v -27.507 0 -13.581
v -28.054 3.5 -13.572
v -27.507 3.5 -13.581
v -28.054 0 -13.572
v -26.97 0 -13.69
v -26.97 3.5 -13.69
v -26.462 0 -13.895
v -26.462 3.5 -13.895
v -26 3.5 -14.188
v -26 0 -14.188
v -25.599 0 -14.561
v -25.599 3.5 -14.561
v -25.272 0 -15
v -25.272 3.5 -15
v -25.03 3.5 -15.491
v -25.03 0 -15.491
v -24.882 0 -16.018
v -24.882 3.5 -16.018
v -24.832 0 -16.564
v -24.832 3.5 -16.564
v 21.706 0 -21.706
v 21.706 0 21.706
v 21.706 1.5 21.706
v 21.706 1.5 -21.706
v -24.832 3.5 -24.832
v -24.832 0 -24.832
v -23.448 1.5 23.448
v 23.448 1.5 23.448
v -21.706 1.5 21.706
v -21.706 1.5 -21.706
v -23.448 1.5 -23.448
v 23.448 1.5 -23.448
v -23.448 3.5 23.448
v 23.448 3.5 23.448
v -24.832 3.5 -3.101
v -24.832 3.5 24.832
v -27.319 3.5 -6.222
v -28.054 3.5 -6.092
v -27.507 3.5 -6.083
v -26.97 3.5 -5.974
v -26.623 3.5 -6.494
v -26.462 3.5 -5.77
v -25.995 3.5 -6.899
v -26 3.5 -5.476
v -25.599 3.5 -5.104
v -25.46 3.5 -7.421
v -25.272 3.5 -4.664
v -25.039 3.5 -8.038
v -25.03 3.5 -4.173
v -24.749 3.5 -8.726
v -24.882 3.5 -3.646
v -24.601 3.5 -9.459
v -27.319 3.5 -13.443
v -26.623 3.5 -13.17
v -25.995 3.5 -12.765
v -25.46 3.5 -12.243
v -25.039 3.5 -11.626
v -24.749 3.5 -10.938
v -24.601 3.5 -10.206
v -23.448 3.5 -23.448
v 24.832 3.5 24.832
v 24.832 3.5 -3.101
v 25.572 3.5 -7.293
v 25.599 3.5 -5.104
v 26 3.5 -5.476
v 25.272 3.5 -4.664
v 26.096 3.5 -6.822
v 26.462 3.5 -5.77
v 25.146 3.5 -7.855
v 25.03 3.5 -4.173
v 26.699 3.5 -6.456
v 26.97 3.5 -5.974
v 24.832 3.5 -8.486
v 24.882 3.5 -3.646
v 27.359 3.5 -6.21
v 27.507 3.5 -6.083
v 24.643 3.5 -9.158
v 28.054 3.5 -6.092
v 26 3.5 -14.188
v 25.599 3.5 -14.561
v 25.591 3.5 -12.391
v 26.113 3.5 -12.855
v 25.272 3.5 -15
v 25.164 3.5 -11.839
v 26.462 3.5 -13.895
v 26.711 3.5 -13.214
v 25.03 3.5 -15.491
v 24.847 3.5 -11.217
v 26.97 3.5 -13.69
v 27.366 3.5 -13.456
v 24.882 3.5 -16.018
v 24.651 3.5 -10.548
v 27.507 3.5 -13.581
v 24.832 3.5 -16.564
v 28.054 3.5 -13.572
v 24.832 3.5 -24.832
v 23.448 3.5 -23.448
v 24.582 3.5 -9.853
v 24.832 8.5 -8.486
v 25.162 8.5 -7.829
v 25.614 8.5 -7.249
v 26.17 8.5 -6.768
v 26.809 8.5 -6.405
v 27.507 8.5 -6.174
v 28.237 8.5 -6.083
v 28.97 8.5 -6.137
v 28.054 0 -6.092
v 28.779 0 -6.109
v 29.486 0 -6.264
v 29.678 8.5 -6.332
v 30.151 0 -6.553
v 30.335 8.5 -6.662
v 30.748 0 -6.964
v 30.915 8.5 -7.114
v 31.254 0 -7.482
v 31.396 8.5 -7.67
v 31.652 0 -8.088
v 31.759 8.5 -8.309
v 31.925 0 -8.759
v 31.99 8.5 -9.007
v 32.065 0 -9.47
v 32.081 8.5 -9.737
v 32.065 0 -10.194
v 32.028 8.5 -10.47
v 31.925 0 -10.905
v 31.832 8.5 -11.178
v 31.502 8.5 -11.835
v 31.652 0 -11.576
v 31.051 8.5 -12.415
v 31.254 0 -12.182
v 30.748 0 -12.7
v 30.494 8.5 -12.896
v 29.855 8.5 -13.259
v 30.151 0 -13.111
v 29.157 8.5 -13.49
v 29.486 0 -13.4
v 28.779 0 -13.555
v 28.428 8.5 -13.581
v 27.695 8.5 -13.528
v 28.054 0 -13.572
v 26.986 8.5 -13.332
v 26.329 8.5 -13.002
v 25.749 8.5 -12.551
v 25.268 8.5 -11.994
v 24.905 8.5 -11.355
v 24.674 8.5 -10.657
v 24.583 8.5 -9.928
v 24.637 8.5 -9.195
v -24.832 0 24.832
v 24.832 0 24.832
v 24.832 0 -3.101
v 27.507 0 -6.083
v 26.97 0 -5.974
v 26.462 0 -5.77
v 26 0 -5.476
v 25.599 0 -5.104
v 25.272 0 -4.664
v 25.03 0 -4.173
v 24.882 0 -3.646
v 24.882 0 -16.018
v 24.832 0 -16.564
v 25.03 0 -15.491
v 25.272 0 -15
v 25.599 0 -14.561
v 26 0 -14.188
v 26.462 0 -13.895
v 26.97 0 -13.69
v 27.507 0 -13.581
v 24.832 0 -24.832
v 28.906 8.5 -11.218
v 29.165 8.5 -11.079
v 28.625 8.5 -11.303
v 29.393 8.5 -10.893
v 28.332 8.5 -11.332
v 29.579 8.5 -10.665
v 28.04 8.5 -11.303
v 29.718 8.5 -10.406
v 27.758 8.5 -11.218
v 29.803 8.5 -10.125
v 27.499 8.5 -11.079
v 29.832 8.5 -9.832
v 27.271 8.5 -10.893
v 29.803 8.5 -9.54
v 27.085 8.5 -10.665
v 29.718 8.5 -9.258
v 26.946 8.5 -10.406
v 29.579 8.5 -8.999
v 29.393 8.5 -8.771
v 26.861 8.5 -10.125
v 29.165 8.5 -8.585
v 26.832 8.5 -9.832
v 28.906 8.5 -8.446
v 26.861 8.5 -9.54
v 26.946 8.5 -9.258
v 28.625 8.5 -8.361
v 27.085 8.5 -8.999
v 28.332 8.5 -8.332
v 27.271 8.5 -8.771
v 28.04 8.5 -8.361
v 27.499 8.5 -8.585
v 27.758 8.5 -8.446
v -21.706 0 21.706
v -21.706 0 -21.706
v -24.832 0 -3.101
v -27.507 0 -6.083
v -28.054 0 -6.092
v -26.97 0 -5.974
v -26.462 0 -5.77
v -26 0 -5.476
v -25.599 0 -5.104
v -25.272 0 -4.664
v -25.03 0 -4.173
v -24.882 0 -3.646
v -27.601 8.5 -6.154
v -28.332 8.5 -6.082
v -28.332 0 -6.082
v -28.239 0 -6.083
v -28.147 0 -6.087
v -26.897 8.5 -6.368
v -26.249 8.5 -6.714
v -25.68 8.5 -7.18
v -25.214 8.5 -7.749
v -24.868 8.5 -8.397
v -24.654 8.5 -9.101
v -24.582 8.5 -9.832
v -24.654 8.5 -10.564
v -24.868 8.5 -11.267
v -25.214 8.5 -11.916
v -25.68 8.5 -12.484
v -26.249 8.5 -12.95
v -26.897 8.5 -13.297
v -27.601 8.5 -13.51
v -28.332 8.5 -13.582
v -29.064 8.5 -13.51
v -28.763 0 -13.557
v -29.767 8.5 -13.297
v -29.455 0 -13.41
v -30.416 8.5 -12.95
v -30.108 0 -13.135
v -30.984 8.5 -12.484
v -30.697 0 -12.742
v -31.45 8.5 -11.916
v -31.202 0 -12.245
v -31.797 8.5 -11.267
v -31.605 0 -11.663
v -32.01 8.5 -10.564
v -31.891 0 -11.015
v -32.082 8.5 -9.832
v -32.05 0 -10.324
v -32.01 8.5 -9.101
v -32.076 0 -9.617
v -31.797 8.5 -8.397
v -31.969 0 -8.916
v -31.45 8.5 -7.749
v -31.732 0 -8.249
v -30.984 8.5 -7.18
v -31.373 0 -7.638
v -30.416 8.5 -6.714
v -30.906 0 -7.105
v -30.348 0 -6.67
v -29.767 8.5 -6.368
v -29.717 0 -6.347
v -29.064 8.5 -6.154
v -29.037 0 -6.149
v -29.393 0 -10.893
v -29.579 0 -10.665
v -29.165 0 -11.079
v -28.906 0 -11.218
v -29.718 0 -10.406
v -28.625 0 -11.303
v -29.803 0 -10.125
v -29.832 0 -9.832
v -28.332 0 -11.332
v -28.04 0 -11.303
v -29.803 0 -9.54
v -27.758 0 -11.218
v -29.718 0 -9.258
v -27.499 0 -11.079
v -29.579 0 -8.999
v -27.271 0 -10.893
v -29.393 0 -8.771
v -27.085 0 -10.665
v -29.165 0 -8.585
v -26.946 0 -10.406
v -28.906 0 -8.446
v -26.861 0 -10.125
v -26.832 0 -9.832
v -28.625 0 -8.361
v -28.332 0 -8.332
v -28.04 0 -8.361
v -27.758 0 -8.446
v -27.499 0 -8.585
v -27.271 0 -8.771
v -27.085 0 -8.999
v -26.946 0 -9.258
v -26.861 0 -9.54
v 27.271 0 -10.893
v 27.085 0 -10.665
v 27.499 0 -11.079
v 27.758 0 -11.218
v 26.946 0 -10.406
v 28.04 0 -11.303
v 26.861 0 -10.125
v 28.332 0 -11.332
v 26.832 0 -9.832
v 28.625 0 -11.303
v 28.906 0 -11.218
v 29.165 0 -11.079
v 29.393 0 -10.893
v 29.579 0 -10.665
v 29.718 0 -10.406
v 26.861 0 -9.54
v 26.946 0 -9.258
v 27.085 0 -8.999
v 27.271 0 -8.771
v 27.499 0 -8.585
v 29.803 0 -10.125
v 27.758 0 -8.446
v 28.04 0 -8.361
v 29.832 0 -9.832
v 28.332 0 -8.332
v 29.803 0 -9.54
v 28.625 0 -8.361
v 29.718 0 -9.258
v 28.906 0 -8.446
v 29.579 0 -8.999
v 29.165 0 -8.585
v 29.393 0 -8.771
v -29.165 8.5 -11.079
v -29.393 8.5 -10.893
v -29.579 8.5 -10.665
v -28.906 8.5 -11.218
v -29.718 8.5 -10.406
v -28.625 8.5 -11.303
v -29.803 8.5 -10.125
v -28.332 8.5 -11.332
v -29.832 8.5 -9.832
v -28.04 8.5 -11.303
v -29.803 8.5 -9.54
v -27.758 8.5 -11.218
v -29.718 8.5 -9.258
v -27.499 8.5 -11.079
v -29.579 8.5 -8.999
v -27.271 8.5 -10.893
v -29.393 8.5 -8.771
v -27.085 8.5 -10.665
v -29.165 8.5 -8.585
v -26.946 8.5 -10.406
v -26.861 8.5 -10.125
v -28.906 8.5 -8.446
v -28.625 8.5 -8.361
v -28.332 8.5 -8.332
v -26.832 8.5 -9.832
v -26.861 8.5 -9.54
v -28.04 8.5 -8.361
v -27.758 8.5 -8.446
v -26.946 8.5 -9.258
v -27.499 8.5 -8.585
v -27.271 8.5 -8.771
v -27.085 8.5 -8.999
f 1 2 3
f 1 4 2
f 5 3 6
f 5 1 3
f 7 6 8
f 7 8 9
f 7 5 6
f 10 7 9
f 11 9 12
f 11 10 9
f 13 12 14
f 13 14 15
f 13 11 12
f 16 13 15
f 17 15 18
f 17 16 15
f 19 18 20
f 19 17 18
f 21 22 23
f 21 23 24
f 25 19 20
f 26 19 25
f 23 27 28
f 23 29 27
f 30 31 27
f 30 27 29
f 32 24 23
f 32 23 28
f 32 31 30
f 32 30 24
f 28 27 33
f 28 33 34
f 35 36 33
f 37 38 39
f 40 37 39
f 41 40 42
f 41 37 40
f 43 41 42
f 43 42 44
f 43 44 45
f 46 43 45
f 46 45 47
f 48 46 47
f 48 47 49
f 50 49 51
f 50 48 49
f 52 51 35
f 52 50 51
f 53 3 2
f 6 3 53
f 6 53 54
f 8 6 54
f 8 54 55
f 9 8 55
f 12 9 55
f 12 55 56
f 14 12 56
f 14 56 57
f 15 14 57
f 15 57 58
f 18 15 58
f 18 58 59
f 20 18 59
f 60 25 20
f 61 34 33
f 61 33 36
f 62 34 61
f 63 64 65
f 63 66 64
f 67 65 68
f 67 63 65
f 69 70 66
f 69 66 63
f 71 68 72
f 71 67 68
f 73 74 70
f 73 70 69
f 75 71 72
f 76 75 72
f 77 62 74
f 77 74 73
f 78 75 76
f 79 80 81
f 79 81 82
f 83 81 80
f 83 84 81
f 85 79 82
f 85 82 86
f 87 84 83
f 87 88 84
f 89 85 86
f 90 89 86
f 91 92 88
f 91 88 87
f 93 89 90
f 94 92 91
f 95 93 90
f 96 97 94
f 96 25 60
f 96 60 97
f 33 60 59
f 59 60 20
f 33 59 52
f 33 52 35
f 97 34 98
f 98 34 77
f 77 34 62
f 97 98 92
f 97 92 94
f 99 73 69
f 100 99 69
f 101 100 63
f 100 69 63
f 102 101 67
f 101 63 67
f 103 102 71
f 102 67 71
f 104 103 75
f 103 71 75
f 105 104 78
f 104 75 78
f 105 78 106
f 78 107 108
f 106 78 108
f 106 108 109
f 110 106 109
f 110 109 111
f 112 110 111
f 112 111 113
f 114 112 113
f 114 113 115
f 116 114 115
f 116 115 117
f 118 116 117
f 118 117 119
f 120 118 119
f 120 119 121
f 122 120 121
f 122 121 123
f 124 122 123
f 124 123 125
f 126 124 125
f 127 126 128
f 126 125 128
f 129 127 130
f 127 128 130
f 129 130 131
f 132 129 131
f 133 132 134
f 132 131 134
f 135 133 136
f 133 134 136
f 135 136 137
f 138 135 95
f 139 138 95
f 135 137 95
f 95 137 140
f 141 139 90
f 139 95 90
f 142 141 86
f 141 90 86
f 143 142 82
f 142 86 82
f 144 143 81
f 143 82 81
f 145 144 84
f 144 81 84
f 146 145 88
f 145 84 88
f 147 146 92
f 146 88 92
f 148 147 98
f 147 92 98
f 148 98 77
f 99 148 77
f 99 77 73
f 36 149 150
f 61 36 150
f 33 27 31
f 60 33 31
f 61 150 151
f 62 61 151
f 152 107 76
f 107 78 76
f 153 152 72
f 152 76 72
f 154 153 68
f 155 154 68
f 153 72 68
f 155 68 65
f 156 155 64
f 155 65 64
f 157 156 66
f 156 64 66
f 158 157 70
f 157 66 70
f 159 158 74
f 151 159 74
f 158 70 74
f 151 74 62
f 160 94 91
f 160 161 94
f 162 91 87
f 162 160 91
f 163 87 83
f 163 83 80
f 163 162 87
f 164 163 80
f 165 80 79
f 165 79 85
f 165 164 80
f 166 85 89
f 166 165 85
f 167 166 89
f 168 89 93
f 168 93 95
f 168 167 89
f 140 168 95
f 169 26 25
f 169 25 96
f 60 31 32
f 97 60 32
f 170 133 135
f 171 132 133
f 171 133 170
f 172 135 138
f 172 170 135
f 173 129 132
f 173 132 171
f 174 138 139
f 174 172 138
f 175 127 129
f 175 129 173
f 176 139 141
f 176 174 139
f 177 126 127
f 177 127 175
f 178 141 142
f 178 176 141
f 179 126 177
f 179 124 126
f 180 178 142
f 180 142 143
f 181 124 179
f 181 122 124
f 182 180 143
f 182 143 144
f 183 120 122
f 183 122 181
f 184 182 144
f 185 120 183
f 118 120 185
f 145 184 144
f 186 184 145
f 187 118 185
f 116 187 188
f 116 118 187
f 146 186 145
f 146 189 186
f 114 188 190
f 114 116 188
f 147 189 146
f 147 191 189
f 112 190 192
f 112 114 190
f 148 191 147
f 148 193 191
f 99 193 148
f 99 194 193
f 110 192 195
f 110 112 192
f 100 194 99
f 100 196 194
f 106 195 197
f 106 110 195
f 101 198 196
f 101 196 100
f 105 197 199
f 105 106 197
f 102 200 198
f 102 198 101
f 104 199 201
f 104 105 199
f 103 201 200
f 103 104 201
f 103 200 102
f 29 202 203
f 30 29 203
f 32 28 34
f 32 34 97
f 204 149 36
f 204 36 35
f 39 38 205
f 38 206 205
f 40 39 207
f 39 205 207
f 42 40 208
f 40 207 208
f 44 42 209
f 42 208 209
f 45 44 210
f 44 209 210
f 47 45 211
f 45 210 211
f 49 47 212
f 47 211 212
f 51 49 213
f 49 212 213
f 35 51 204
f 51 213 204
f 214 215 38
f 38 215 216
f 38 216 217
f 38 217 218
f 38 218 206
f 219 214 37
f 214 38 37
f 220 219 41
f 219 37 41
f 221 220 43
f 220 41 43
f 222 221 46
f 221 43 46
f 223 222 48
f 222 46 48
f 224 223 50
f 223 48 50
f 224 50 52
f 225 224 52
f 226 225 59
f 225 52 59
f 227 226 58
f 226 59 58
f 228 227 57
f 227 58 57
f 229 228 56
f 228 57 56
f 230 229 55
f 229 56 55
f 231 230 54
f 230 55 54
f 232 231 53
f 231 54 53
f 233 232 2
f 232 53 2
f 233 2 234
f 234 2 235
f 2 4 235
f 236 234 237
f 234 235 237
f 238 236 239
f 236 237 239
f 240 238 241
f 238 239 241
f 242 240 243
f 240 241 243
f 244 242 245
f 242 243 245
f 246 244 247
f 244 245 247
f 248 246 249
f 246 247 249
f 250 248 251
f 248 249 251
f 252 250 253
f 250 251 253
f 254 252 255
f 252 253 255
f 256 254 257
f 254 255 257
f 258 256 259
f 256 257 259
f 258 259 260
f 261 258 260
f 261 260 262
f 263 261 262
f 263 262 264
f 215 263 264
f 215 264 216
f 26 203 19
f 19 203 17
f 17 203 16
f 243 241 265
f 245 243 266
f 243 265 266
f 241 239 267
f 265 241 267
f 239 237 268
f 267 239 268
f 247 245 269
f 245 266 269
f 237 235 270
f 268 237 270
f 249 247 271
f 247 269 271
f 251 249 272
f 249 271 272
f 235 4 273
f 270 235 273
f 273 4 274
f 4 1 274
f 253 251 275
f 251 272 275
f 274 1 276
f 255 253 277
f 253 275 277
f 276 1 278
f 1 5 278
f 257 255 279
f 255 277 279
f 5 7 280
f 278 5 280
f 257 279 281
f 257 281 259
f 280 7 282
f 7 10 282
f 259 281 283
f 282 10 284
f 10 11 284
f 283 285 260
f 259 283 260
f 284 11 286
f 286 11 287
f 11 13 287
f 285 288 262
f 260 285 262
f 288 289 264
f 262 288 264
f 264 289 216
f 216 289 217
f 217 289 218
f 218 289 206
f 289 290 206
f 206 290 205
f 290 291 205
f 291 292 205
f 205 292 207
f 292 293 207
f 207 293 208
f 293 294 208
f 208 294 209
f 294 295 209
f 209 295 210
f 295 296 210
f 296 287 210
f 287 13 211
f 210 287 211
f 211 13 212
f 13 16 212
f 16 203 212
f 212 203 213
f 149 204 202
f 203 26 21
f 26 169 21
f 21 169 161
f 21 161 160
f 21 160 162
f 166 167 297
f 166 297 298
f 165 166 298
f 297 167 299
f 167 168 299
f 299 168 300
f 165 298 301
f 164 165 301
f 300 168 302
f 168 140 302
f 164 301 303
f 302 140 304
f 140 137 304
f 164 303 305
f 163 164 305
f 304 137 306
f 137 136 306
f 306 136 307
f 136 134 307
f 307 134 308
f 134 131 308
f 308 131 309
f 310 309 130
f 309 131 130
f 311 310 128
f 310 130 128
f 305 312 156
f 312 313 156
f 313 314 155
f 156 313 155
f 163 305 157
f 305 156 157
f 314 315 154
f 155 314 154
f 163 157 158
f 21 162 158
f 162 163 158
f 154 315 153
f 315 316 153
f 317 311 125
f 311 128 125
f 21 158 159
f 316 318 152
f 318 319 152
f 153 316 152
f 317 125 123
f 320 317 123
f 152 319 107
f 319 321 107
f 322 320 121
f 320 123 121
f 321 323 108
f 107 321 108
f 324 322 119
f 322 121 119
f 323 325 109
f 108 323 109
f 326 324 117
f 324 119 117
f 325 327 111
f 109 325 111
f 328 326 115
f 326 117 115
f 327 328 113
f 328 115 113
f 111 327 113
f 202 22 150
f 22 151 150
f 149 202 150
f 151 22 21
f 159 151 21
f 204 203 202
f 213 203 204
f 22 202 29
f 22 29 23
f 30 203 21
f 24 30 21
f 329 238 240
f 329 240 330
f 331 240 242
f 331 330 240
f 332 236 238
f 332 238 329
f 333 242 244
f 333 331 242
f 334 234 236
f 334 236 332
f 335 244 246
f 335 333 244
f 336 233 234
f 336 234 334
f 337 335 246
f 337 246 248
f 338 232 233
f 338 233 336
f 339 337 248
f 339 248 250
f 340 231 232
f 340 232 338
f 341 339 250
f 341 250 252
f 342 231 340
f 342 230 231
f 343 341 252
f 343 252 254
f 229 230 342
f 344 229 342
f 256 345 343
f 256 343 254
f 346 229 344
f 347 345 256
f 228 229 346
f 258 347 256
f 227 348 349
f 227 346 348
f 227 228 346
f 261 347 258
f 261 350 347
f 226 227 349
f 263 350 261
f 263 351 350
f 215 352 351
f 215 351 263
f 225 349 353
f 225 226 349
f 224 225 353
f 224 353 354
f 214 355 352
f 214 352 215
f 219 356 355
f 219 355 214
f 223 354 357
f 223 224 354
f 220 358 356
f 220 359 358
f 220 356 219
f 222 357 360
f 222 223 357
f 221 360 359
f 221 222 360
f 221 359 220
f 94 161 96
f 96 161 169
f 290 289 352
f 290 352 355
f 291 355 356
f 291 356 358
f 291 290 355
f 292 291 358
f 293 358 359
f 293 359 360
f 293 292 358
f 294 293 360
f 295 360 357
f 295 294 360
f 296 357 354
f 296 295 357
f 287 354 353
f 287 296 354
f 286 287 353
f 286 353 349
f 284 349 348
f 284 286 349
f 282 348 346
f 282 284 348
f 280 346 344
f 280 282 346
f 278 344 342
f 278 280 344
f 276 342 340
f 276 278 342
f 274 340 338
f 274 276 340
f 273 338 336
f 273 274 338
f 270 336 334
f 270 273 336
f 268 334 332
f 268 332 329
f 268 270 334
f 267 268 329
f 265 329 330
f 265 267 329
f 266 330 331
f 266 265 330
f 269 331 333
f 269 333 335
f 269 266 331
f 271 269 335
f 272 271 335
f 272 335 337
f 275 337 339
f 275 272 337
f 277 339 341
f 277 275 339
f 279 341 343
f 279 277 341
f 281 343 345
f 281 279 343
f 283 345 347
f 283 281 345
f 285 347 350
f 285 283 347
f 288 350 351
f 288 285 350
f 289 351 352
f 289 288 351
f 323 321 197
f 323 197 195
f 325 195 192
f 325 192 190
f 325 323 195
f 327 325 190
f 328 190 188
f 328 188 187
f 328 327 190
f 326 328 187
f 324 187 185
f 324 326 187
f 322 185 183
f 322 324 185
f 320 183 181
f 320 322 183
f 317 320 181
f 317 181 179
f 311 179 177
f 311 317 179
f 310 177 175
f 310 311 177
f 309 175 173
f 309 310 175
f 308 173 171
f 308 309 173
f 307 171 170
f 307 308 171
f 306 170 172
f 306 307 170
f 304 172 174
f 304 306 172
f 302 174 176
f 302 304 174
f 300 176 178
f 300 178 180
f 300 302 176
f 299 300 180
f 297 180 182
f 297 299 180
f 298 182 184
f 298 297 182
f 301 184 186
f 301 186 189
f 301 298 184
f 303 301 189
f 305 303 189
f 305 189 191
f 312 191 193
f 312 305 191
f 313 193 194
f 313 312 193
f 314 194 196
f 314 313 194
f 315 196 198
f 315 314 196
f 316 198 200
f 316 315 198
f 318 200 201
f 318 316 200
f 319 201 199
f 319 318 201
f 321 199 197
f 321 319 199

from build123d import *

# Parameters (mm, degrees)
SKETCH1_W           = 46.896511464
SKETCH1_H           = 46.896511464
SKETCH1_W_2         = 43.412298388
SKETCH1_H_2         = 43.412298388
BOSS_EXTRUDE1_DEPTH = 1.5
SKETCH1_3_W         = 49.664280744
SKETCH1_3_H         = 49.664280744
SKETCH1_3_W_2       = 46.896511464
SKETCH1_3_H_2       = 46.896511464
BOSS_EXTRUDE2_DEPTH = 3.5
BOSS_EXTRUDE4_START = -3.5
SKETCH2_R           = 3.75
SKETCH2_R_2         = 1.5
BOSS_EXTRUDE4_DEPTH = 8.5
FILLET2_R           = 3


with BuildPart() as part:
    # Sketch1 → Boss-Extrude1 (new body)
    with BuildSketch(Plane(origin=(0, 0, 0), x_dir=(1, 0, 0), z_dir=(0, 1, 0))):
        Rectangle(SKETCH1_W, SKETCH1_H)
        Rectangle(SKETCH1_W_2, SKETCH1_H_2, mode=Mode.SUBTRACT)
    extrude(amount=BOSS_EXTRUDE1_DEPTH)

    # Sketch1<3> → Boss-Extrude2 (add)
    with BuildSketch(Plane(origin=(0, 0, 0), x_dir=(1, 0, 0), z_dir=(0, 1, 0))):
        Rectangle(SKETCH1_3_W, SKETCH1_3_H)
        Rectangle(SKETCH1_3_W_2, SKETCH1_3_H_2, mode=Mode.SUBTRACT)
    extrude(amount=BOSS_EXTRUDE2_DEPTH)

    # Sketch2 → Boss-Extrude4 (add)
    # profile 1 of 2: a face of its own
    with BuildSketch(Plane(origin=(0, 3.5, 0), x_dir=(1, 0, 0), z_dir=(0, 1, 0)).offset(BOSS_EXTRUDE4_START)):
        with Locations(Location((-28.332140372, 9.832140372, 0), (0, 0, 270))):
            Circle(SKETCH2_R)
        with Locations(Location((-28.332140372, 9.832140372, 0), (0, 0, 270))):
            Circle(SKETCH2_R_2, mode=Mode.SUBTRACT)
    # profile 2 of 2: a face of its own
    with BuildSketch(Plane(origin=(0, 3.5, 0), x_dir=(1, 0, 0), z_dir=(0, 1, 0)).offset(BOSS_EXTRUDE4_START)):
        with Locations(Location((28.332140372, 9.832140372, 0), (0, 0, 201.039469781))):
            Circle(SKETCH2_R)
        with Locations(Location((28.332140372, 9.832140372, 0), (0, 0, 270))):
            Circle(SKETCH2_R_2, mode=Mode.SUBTRACT)
    extrude(amount=BOSS_EXTRUDE4_DEPTH)

    # Fillet2
    fillet2_edges = [part.edges().sort_by_distance(p)[0] for p in [
        (-24.832140372, 1.75, -8.48584917),
        (-24.832140372, 1.75, -11.178431574),
        (24.832140372, 1.75, -8.48584917),
        (24.832140372, 1.75, -11.178431574),
    ]]
    fillet(fillet2_edges, radius=FILLET2_R)


solid = part.part
